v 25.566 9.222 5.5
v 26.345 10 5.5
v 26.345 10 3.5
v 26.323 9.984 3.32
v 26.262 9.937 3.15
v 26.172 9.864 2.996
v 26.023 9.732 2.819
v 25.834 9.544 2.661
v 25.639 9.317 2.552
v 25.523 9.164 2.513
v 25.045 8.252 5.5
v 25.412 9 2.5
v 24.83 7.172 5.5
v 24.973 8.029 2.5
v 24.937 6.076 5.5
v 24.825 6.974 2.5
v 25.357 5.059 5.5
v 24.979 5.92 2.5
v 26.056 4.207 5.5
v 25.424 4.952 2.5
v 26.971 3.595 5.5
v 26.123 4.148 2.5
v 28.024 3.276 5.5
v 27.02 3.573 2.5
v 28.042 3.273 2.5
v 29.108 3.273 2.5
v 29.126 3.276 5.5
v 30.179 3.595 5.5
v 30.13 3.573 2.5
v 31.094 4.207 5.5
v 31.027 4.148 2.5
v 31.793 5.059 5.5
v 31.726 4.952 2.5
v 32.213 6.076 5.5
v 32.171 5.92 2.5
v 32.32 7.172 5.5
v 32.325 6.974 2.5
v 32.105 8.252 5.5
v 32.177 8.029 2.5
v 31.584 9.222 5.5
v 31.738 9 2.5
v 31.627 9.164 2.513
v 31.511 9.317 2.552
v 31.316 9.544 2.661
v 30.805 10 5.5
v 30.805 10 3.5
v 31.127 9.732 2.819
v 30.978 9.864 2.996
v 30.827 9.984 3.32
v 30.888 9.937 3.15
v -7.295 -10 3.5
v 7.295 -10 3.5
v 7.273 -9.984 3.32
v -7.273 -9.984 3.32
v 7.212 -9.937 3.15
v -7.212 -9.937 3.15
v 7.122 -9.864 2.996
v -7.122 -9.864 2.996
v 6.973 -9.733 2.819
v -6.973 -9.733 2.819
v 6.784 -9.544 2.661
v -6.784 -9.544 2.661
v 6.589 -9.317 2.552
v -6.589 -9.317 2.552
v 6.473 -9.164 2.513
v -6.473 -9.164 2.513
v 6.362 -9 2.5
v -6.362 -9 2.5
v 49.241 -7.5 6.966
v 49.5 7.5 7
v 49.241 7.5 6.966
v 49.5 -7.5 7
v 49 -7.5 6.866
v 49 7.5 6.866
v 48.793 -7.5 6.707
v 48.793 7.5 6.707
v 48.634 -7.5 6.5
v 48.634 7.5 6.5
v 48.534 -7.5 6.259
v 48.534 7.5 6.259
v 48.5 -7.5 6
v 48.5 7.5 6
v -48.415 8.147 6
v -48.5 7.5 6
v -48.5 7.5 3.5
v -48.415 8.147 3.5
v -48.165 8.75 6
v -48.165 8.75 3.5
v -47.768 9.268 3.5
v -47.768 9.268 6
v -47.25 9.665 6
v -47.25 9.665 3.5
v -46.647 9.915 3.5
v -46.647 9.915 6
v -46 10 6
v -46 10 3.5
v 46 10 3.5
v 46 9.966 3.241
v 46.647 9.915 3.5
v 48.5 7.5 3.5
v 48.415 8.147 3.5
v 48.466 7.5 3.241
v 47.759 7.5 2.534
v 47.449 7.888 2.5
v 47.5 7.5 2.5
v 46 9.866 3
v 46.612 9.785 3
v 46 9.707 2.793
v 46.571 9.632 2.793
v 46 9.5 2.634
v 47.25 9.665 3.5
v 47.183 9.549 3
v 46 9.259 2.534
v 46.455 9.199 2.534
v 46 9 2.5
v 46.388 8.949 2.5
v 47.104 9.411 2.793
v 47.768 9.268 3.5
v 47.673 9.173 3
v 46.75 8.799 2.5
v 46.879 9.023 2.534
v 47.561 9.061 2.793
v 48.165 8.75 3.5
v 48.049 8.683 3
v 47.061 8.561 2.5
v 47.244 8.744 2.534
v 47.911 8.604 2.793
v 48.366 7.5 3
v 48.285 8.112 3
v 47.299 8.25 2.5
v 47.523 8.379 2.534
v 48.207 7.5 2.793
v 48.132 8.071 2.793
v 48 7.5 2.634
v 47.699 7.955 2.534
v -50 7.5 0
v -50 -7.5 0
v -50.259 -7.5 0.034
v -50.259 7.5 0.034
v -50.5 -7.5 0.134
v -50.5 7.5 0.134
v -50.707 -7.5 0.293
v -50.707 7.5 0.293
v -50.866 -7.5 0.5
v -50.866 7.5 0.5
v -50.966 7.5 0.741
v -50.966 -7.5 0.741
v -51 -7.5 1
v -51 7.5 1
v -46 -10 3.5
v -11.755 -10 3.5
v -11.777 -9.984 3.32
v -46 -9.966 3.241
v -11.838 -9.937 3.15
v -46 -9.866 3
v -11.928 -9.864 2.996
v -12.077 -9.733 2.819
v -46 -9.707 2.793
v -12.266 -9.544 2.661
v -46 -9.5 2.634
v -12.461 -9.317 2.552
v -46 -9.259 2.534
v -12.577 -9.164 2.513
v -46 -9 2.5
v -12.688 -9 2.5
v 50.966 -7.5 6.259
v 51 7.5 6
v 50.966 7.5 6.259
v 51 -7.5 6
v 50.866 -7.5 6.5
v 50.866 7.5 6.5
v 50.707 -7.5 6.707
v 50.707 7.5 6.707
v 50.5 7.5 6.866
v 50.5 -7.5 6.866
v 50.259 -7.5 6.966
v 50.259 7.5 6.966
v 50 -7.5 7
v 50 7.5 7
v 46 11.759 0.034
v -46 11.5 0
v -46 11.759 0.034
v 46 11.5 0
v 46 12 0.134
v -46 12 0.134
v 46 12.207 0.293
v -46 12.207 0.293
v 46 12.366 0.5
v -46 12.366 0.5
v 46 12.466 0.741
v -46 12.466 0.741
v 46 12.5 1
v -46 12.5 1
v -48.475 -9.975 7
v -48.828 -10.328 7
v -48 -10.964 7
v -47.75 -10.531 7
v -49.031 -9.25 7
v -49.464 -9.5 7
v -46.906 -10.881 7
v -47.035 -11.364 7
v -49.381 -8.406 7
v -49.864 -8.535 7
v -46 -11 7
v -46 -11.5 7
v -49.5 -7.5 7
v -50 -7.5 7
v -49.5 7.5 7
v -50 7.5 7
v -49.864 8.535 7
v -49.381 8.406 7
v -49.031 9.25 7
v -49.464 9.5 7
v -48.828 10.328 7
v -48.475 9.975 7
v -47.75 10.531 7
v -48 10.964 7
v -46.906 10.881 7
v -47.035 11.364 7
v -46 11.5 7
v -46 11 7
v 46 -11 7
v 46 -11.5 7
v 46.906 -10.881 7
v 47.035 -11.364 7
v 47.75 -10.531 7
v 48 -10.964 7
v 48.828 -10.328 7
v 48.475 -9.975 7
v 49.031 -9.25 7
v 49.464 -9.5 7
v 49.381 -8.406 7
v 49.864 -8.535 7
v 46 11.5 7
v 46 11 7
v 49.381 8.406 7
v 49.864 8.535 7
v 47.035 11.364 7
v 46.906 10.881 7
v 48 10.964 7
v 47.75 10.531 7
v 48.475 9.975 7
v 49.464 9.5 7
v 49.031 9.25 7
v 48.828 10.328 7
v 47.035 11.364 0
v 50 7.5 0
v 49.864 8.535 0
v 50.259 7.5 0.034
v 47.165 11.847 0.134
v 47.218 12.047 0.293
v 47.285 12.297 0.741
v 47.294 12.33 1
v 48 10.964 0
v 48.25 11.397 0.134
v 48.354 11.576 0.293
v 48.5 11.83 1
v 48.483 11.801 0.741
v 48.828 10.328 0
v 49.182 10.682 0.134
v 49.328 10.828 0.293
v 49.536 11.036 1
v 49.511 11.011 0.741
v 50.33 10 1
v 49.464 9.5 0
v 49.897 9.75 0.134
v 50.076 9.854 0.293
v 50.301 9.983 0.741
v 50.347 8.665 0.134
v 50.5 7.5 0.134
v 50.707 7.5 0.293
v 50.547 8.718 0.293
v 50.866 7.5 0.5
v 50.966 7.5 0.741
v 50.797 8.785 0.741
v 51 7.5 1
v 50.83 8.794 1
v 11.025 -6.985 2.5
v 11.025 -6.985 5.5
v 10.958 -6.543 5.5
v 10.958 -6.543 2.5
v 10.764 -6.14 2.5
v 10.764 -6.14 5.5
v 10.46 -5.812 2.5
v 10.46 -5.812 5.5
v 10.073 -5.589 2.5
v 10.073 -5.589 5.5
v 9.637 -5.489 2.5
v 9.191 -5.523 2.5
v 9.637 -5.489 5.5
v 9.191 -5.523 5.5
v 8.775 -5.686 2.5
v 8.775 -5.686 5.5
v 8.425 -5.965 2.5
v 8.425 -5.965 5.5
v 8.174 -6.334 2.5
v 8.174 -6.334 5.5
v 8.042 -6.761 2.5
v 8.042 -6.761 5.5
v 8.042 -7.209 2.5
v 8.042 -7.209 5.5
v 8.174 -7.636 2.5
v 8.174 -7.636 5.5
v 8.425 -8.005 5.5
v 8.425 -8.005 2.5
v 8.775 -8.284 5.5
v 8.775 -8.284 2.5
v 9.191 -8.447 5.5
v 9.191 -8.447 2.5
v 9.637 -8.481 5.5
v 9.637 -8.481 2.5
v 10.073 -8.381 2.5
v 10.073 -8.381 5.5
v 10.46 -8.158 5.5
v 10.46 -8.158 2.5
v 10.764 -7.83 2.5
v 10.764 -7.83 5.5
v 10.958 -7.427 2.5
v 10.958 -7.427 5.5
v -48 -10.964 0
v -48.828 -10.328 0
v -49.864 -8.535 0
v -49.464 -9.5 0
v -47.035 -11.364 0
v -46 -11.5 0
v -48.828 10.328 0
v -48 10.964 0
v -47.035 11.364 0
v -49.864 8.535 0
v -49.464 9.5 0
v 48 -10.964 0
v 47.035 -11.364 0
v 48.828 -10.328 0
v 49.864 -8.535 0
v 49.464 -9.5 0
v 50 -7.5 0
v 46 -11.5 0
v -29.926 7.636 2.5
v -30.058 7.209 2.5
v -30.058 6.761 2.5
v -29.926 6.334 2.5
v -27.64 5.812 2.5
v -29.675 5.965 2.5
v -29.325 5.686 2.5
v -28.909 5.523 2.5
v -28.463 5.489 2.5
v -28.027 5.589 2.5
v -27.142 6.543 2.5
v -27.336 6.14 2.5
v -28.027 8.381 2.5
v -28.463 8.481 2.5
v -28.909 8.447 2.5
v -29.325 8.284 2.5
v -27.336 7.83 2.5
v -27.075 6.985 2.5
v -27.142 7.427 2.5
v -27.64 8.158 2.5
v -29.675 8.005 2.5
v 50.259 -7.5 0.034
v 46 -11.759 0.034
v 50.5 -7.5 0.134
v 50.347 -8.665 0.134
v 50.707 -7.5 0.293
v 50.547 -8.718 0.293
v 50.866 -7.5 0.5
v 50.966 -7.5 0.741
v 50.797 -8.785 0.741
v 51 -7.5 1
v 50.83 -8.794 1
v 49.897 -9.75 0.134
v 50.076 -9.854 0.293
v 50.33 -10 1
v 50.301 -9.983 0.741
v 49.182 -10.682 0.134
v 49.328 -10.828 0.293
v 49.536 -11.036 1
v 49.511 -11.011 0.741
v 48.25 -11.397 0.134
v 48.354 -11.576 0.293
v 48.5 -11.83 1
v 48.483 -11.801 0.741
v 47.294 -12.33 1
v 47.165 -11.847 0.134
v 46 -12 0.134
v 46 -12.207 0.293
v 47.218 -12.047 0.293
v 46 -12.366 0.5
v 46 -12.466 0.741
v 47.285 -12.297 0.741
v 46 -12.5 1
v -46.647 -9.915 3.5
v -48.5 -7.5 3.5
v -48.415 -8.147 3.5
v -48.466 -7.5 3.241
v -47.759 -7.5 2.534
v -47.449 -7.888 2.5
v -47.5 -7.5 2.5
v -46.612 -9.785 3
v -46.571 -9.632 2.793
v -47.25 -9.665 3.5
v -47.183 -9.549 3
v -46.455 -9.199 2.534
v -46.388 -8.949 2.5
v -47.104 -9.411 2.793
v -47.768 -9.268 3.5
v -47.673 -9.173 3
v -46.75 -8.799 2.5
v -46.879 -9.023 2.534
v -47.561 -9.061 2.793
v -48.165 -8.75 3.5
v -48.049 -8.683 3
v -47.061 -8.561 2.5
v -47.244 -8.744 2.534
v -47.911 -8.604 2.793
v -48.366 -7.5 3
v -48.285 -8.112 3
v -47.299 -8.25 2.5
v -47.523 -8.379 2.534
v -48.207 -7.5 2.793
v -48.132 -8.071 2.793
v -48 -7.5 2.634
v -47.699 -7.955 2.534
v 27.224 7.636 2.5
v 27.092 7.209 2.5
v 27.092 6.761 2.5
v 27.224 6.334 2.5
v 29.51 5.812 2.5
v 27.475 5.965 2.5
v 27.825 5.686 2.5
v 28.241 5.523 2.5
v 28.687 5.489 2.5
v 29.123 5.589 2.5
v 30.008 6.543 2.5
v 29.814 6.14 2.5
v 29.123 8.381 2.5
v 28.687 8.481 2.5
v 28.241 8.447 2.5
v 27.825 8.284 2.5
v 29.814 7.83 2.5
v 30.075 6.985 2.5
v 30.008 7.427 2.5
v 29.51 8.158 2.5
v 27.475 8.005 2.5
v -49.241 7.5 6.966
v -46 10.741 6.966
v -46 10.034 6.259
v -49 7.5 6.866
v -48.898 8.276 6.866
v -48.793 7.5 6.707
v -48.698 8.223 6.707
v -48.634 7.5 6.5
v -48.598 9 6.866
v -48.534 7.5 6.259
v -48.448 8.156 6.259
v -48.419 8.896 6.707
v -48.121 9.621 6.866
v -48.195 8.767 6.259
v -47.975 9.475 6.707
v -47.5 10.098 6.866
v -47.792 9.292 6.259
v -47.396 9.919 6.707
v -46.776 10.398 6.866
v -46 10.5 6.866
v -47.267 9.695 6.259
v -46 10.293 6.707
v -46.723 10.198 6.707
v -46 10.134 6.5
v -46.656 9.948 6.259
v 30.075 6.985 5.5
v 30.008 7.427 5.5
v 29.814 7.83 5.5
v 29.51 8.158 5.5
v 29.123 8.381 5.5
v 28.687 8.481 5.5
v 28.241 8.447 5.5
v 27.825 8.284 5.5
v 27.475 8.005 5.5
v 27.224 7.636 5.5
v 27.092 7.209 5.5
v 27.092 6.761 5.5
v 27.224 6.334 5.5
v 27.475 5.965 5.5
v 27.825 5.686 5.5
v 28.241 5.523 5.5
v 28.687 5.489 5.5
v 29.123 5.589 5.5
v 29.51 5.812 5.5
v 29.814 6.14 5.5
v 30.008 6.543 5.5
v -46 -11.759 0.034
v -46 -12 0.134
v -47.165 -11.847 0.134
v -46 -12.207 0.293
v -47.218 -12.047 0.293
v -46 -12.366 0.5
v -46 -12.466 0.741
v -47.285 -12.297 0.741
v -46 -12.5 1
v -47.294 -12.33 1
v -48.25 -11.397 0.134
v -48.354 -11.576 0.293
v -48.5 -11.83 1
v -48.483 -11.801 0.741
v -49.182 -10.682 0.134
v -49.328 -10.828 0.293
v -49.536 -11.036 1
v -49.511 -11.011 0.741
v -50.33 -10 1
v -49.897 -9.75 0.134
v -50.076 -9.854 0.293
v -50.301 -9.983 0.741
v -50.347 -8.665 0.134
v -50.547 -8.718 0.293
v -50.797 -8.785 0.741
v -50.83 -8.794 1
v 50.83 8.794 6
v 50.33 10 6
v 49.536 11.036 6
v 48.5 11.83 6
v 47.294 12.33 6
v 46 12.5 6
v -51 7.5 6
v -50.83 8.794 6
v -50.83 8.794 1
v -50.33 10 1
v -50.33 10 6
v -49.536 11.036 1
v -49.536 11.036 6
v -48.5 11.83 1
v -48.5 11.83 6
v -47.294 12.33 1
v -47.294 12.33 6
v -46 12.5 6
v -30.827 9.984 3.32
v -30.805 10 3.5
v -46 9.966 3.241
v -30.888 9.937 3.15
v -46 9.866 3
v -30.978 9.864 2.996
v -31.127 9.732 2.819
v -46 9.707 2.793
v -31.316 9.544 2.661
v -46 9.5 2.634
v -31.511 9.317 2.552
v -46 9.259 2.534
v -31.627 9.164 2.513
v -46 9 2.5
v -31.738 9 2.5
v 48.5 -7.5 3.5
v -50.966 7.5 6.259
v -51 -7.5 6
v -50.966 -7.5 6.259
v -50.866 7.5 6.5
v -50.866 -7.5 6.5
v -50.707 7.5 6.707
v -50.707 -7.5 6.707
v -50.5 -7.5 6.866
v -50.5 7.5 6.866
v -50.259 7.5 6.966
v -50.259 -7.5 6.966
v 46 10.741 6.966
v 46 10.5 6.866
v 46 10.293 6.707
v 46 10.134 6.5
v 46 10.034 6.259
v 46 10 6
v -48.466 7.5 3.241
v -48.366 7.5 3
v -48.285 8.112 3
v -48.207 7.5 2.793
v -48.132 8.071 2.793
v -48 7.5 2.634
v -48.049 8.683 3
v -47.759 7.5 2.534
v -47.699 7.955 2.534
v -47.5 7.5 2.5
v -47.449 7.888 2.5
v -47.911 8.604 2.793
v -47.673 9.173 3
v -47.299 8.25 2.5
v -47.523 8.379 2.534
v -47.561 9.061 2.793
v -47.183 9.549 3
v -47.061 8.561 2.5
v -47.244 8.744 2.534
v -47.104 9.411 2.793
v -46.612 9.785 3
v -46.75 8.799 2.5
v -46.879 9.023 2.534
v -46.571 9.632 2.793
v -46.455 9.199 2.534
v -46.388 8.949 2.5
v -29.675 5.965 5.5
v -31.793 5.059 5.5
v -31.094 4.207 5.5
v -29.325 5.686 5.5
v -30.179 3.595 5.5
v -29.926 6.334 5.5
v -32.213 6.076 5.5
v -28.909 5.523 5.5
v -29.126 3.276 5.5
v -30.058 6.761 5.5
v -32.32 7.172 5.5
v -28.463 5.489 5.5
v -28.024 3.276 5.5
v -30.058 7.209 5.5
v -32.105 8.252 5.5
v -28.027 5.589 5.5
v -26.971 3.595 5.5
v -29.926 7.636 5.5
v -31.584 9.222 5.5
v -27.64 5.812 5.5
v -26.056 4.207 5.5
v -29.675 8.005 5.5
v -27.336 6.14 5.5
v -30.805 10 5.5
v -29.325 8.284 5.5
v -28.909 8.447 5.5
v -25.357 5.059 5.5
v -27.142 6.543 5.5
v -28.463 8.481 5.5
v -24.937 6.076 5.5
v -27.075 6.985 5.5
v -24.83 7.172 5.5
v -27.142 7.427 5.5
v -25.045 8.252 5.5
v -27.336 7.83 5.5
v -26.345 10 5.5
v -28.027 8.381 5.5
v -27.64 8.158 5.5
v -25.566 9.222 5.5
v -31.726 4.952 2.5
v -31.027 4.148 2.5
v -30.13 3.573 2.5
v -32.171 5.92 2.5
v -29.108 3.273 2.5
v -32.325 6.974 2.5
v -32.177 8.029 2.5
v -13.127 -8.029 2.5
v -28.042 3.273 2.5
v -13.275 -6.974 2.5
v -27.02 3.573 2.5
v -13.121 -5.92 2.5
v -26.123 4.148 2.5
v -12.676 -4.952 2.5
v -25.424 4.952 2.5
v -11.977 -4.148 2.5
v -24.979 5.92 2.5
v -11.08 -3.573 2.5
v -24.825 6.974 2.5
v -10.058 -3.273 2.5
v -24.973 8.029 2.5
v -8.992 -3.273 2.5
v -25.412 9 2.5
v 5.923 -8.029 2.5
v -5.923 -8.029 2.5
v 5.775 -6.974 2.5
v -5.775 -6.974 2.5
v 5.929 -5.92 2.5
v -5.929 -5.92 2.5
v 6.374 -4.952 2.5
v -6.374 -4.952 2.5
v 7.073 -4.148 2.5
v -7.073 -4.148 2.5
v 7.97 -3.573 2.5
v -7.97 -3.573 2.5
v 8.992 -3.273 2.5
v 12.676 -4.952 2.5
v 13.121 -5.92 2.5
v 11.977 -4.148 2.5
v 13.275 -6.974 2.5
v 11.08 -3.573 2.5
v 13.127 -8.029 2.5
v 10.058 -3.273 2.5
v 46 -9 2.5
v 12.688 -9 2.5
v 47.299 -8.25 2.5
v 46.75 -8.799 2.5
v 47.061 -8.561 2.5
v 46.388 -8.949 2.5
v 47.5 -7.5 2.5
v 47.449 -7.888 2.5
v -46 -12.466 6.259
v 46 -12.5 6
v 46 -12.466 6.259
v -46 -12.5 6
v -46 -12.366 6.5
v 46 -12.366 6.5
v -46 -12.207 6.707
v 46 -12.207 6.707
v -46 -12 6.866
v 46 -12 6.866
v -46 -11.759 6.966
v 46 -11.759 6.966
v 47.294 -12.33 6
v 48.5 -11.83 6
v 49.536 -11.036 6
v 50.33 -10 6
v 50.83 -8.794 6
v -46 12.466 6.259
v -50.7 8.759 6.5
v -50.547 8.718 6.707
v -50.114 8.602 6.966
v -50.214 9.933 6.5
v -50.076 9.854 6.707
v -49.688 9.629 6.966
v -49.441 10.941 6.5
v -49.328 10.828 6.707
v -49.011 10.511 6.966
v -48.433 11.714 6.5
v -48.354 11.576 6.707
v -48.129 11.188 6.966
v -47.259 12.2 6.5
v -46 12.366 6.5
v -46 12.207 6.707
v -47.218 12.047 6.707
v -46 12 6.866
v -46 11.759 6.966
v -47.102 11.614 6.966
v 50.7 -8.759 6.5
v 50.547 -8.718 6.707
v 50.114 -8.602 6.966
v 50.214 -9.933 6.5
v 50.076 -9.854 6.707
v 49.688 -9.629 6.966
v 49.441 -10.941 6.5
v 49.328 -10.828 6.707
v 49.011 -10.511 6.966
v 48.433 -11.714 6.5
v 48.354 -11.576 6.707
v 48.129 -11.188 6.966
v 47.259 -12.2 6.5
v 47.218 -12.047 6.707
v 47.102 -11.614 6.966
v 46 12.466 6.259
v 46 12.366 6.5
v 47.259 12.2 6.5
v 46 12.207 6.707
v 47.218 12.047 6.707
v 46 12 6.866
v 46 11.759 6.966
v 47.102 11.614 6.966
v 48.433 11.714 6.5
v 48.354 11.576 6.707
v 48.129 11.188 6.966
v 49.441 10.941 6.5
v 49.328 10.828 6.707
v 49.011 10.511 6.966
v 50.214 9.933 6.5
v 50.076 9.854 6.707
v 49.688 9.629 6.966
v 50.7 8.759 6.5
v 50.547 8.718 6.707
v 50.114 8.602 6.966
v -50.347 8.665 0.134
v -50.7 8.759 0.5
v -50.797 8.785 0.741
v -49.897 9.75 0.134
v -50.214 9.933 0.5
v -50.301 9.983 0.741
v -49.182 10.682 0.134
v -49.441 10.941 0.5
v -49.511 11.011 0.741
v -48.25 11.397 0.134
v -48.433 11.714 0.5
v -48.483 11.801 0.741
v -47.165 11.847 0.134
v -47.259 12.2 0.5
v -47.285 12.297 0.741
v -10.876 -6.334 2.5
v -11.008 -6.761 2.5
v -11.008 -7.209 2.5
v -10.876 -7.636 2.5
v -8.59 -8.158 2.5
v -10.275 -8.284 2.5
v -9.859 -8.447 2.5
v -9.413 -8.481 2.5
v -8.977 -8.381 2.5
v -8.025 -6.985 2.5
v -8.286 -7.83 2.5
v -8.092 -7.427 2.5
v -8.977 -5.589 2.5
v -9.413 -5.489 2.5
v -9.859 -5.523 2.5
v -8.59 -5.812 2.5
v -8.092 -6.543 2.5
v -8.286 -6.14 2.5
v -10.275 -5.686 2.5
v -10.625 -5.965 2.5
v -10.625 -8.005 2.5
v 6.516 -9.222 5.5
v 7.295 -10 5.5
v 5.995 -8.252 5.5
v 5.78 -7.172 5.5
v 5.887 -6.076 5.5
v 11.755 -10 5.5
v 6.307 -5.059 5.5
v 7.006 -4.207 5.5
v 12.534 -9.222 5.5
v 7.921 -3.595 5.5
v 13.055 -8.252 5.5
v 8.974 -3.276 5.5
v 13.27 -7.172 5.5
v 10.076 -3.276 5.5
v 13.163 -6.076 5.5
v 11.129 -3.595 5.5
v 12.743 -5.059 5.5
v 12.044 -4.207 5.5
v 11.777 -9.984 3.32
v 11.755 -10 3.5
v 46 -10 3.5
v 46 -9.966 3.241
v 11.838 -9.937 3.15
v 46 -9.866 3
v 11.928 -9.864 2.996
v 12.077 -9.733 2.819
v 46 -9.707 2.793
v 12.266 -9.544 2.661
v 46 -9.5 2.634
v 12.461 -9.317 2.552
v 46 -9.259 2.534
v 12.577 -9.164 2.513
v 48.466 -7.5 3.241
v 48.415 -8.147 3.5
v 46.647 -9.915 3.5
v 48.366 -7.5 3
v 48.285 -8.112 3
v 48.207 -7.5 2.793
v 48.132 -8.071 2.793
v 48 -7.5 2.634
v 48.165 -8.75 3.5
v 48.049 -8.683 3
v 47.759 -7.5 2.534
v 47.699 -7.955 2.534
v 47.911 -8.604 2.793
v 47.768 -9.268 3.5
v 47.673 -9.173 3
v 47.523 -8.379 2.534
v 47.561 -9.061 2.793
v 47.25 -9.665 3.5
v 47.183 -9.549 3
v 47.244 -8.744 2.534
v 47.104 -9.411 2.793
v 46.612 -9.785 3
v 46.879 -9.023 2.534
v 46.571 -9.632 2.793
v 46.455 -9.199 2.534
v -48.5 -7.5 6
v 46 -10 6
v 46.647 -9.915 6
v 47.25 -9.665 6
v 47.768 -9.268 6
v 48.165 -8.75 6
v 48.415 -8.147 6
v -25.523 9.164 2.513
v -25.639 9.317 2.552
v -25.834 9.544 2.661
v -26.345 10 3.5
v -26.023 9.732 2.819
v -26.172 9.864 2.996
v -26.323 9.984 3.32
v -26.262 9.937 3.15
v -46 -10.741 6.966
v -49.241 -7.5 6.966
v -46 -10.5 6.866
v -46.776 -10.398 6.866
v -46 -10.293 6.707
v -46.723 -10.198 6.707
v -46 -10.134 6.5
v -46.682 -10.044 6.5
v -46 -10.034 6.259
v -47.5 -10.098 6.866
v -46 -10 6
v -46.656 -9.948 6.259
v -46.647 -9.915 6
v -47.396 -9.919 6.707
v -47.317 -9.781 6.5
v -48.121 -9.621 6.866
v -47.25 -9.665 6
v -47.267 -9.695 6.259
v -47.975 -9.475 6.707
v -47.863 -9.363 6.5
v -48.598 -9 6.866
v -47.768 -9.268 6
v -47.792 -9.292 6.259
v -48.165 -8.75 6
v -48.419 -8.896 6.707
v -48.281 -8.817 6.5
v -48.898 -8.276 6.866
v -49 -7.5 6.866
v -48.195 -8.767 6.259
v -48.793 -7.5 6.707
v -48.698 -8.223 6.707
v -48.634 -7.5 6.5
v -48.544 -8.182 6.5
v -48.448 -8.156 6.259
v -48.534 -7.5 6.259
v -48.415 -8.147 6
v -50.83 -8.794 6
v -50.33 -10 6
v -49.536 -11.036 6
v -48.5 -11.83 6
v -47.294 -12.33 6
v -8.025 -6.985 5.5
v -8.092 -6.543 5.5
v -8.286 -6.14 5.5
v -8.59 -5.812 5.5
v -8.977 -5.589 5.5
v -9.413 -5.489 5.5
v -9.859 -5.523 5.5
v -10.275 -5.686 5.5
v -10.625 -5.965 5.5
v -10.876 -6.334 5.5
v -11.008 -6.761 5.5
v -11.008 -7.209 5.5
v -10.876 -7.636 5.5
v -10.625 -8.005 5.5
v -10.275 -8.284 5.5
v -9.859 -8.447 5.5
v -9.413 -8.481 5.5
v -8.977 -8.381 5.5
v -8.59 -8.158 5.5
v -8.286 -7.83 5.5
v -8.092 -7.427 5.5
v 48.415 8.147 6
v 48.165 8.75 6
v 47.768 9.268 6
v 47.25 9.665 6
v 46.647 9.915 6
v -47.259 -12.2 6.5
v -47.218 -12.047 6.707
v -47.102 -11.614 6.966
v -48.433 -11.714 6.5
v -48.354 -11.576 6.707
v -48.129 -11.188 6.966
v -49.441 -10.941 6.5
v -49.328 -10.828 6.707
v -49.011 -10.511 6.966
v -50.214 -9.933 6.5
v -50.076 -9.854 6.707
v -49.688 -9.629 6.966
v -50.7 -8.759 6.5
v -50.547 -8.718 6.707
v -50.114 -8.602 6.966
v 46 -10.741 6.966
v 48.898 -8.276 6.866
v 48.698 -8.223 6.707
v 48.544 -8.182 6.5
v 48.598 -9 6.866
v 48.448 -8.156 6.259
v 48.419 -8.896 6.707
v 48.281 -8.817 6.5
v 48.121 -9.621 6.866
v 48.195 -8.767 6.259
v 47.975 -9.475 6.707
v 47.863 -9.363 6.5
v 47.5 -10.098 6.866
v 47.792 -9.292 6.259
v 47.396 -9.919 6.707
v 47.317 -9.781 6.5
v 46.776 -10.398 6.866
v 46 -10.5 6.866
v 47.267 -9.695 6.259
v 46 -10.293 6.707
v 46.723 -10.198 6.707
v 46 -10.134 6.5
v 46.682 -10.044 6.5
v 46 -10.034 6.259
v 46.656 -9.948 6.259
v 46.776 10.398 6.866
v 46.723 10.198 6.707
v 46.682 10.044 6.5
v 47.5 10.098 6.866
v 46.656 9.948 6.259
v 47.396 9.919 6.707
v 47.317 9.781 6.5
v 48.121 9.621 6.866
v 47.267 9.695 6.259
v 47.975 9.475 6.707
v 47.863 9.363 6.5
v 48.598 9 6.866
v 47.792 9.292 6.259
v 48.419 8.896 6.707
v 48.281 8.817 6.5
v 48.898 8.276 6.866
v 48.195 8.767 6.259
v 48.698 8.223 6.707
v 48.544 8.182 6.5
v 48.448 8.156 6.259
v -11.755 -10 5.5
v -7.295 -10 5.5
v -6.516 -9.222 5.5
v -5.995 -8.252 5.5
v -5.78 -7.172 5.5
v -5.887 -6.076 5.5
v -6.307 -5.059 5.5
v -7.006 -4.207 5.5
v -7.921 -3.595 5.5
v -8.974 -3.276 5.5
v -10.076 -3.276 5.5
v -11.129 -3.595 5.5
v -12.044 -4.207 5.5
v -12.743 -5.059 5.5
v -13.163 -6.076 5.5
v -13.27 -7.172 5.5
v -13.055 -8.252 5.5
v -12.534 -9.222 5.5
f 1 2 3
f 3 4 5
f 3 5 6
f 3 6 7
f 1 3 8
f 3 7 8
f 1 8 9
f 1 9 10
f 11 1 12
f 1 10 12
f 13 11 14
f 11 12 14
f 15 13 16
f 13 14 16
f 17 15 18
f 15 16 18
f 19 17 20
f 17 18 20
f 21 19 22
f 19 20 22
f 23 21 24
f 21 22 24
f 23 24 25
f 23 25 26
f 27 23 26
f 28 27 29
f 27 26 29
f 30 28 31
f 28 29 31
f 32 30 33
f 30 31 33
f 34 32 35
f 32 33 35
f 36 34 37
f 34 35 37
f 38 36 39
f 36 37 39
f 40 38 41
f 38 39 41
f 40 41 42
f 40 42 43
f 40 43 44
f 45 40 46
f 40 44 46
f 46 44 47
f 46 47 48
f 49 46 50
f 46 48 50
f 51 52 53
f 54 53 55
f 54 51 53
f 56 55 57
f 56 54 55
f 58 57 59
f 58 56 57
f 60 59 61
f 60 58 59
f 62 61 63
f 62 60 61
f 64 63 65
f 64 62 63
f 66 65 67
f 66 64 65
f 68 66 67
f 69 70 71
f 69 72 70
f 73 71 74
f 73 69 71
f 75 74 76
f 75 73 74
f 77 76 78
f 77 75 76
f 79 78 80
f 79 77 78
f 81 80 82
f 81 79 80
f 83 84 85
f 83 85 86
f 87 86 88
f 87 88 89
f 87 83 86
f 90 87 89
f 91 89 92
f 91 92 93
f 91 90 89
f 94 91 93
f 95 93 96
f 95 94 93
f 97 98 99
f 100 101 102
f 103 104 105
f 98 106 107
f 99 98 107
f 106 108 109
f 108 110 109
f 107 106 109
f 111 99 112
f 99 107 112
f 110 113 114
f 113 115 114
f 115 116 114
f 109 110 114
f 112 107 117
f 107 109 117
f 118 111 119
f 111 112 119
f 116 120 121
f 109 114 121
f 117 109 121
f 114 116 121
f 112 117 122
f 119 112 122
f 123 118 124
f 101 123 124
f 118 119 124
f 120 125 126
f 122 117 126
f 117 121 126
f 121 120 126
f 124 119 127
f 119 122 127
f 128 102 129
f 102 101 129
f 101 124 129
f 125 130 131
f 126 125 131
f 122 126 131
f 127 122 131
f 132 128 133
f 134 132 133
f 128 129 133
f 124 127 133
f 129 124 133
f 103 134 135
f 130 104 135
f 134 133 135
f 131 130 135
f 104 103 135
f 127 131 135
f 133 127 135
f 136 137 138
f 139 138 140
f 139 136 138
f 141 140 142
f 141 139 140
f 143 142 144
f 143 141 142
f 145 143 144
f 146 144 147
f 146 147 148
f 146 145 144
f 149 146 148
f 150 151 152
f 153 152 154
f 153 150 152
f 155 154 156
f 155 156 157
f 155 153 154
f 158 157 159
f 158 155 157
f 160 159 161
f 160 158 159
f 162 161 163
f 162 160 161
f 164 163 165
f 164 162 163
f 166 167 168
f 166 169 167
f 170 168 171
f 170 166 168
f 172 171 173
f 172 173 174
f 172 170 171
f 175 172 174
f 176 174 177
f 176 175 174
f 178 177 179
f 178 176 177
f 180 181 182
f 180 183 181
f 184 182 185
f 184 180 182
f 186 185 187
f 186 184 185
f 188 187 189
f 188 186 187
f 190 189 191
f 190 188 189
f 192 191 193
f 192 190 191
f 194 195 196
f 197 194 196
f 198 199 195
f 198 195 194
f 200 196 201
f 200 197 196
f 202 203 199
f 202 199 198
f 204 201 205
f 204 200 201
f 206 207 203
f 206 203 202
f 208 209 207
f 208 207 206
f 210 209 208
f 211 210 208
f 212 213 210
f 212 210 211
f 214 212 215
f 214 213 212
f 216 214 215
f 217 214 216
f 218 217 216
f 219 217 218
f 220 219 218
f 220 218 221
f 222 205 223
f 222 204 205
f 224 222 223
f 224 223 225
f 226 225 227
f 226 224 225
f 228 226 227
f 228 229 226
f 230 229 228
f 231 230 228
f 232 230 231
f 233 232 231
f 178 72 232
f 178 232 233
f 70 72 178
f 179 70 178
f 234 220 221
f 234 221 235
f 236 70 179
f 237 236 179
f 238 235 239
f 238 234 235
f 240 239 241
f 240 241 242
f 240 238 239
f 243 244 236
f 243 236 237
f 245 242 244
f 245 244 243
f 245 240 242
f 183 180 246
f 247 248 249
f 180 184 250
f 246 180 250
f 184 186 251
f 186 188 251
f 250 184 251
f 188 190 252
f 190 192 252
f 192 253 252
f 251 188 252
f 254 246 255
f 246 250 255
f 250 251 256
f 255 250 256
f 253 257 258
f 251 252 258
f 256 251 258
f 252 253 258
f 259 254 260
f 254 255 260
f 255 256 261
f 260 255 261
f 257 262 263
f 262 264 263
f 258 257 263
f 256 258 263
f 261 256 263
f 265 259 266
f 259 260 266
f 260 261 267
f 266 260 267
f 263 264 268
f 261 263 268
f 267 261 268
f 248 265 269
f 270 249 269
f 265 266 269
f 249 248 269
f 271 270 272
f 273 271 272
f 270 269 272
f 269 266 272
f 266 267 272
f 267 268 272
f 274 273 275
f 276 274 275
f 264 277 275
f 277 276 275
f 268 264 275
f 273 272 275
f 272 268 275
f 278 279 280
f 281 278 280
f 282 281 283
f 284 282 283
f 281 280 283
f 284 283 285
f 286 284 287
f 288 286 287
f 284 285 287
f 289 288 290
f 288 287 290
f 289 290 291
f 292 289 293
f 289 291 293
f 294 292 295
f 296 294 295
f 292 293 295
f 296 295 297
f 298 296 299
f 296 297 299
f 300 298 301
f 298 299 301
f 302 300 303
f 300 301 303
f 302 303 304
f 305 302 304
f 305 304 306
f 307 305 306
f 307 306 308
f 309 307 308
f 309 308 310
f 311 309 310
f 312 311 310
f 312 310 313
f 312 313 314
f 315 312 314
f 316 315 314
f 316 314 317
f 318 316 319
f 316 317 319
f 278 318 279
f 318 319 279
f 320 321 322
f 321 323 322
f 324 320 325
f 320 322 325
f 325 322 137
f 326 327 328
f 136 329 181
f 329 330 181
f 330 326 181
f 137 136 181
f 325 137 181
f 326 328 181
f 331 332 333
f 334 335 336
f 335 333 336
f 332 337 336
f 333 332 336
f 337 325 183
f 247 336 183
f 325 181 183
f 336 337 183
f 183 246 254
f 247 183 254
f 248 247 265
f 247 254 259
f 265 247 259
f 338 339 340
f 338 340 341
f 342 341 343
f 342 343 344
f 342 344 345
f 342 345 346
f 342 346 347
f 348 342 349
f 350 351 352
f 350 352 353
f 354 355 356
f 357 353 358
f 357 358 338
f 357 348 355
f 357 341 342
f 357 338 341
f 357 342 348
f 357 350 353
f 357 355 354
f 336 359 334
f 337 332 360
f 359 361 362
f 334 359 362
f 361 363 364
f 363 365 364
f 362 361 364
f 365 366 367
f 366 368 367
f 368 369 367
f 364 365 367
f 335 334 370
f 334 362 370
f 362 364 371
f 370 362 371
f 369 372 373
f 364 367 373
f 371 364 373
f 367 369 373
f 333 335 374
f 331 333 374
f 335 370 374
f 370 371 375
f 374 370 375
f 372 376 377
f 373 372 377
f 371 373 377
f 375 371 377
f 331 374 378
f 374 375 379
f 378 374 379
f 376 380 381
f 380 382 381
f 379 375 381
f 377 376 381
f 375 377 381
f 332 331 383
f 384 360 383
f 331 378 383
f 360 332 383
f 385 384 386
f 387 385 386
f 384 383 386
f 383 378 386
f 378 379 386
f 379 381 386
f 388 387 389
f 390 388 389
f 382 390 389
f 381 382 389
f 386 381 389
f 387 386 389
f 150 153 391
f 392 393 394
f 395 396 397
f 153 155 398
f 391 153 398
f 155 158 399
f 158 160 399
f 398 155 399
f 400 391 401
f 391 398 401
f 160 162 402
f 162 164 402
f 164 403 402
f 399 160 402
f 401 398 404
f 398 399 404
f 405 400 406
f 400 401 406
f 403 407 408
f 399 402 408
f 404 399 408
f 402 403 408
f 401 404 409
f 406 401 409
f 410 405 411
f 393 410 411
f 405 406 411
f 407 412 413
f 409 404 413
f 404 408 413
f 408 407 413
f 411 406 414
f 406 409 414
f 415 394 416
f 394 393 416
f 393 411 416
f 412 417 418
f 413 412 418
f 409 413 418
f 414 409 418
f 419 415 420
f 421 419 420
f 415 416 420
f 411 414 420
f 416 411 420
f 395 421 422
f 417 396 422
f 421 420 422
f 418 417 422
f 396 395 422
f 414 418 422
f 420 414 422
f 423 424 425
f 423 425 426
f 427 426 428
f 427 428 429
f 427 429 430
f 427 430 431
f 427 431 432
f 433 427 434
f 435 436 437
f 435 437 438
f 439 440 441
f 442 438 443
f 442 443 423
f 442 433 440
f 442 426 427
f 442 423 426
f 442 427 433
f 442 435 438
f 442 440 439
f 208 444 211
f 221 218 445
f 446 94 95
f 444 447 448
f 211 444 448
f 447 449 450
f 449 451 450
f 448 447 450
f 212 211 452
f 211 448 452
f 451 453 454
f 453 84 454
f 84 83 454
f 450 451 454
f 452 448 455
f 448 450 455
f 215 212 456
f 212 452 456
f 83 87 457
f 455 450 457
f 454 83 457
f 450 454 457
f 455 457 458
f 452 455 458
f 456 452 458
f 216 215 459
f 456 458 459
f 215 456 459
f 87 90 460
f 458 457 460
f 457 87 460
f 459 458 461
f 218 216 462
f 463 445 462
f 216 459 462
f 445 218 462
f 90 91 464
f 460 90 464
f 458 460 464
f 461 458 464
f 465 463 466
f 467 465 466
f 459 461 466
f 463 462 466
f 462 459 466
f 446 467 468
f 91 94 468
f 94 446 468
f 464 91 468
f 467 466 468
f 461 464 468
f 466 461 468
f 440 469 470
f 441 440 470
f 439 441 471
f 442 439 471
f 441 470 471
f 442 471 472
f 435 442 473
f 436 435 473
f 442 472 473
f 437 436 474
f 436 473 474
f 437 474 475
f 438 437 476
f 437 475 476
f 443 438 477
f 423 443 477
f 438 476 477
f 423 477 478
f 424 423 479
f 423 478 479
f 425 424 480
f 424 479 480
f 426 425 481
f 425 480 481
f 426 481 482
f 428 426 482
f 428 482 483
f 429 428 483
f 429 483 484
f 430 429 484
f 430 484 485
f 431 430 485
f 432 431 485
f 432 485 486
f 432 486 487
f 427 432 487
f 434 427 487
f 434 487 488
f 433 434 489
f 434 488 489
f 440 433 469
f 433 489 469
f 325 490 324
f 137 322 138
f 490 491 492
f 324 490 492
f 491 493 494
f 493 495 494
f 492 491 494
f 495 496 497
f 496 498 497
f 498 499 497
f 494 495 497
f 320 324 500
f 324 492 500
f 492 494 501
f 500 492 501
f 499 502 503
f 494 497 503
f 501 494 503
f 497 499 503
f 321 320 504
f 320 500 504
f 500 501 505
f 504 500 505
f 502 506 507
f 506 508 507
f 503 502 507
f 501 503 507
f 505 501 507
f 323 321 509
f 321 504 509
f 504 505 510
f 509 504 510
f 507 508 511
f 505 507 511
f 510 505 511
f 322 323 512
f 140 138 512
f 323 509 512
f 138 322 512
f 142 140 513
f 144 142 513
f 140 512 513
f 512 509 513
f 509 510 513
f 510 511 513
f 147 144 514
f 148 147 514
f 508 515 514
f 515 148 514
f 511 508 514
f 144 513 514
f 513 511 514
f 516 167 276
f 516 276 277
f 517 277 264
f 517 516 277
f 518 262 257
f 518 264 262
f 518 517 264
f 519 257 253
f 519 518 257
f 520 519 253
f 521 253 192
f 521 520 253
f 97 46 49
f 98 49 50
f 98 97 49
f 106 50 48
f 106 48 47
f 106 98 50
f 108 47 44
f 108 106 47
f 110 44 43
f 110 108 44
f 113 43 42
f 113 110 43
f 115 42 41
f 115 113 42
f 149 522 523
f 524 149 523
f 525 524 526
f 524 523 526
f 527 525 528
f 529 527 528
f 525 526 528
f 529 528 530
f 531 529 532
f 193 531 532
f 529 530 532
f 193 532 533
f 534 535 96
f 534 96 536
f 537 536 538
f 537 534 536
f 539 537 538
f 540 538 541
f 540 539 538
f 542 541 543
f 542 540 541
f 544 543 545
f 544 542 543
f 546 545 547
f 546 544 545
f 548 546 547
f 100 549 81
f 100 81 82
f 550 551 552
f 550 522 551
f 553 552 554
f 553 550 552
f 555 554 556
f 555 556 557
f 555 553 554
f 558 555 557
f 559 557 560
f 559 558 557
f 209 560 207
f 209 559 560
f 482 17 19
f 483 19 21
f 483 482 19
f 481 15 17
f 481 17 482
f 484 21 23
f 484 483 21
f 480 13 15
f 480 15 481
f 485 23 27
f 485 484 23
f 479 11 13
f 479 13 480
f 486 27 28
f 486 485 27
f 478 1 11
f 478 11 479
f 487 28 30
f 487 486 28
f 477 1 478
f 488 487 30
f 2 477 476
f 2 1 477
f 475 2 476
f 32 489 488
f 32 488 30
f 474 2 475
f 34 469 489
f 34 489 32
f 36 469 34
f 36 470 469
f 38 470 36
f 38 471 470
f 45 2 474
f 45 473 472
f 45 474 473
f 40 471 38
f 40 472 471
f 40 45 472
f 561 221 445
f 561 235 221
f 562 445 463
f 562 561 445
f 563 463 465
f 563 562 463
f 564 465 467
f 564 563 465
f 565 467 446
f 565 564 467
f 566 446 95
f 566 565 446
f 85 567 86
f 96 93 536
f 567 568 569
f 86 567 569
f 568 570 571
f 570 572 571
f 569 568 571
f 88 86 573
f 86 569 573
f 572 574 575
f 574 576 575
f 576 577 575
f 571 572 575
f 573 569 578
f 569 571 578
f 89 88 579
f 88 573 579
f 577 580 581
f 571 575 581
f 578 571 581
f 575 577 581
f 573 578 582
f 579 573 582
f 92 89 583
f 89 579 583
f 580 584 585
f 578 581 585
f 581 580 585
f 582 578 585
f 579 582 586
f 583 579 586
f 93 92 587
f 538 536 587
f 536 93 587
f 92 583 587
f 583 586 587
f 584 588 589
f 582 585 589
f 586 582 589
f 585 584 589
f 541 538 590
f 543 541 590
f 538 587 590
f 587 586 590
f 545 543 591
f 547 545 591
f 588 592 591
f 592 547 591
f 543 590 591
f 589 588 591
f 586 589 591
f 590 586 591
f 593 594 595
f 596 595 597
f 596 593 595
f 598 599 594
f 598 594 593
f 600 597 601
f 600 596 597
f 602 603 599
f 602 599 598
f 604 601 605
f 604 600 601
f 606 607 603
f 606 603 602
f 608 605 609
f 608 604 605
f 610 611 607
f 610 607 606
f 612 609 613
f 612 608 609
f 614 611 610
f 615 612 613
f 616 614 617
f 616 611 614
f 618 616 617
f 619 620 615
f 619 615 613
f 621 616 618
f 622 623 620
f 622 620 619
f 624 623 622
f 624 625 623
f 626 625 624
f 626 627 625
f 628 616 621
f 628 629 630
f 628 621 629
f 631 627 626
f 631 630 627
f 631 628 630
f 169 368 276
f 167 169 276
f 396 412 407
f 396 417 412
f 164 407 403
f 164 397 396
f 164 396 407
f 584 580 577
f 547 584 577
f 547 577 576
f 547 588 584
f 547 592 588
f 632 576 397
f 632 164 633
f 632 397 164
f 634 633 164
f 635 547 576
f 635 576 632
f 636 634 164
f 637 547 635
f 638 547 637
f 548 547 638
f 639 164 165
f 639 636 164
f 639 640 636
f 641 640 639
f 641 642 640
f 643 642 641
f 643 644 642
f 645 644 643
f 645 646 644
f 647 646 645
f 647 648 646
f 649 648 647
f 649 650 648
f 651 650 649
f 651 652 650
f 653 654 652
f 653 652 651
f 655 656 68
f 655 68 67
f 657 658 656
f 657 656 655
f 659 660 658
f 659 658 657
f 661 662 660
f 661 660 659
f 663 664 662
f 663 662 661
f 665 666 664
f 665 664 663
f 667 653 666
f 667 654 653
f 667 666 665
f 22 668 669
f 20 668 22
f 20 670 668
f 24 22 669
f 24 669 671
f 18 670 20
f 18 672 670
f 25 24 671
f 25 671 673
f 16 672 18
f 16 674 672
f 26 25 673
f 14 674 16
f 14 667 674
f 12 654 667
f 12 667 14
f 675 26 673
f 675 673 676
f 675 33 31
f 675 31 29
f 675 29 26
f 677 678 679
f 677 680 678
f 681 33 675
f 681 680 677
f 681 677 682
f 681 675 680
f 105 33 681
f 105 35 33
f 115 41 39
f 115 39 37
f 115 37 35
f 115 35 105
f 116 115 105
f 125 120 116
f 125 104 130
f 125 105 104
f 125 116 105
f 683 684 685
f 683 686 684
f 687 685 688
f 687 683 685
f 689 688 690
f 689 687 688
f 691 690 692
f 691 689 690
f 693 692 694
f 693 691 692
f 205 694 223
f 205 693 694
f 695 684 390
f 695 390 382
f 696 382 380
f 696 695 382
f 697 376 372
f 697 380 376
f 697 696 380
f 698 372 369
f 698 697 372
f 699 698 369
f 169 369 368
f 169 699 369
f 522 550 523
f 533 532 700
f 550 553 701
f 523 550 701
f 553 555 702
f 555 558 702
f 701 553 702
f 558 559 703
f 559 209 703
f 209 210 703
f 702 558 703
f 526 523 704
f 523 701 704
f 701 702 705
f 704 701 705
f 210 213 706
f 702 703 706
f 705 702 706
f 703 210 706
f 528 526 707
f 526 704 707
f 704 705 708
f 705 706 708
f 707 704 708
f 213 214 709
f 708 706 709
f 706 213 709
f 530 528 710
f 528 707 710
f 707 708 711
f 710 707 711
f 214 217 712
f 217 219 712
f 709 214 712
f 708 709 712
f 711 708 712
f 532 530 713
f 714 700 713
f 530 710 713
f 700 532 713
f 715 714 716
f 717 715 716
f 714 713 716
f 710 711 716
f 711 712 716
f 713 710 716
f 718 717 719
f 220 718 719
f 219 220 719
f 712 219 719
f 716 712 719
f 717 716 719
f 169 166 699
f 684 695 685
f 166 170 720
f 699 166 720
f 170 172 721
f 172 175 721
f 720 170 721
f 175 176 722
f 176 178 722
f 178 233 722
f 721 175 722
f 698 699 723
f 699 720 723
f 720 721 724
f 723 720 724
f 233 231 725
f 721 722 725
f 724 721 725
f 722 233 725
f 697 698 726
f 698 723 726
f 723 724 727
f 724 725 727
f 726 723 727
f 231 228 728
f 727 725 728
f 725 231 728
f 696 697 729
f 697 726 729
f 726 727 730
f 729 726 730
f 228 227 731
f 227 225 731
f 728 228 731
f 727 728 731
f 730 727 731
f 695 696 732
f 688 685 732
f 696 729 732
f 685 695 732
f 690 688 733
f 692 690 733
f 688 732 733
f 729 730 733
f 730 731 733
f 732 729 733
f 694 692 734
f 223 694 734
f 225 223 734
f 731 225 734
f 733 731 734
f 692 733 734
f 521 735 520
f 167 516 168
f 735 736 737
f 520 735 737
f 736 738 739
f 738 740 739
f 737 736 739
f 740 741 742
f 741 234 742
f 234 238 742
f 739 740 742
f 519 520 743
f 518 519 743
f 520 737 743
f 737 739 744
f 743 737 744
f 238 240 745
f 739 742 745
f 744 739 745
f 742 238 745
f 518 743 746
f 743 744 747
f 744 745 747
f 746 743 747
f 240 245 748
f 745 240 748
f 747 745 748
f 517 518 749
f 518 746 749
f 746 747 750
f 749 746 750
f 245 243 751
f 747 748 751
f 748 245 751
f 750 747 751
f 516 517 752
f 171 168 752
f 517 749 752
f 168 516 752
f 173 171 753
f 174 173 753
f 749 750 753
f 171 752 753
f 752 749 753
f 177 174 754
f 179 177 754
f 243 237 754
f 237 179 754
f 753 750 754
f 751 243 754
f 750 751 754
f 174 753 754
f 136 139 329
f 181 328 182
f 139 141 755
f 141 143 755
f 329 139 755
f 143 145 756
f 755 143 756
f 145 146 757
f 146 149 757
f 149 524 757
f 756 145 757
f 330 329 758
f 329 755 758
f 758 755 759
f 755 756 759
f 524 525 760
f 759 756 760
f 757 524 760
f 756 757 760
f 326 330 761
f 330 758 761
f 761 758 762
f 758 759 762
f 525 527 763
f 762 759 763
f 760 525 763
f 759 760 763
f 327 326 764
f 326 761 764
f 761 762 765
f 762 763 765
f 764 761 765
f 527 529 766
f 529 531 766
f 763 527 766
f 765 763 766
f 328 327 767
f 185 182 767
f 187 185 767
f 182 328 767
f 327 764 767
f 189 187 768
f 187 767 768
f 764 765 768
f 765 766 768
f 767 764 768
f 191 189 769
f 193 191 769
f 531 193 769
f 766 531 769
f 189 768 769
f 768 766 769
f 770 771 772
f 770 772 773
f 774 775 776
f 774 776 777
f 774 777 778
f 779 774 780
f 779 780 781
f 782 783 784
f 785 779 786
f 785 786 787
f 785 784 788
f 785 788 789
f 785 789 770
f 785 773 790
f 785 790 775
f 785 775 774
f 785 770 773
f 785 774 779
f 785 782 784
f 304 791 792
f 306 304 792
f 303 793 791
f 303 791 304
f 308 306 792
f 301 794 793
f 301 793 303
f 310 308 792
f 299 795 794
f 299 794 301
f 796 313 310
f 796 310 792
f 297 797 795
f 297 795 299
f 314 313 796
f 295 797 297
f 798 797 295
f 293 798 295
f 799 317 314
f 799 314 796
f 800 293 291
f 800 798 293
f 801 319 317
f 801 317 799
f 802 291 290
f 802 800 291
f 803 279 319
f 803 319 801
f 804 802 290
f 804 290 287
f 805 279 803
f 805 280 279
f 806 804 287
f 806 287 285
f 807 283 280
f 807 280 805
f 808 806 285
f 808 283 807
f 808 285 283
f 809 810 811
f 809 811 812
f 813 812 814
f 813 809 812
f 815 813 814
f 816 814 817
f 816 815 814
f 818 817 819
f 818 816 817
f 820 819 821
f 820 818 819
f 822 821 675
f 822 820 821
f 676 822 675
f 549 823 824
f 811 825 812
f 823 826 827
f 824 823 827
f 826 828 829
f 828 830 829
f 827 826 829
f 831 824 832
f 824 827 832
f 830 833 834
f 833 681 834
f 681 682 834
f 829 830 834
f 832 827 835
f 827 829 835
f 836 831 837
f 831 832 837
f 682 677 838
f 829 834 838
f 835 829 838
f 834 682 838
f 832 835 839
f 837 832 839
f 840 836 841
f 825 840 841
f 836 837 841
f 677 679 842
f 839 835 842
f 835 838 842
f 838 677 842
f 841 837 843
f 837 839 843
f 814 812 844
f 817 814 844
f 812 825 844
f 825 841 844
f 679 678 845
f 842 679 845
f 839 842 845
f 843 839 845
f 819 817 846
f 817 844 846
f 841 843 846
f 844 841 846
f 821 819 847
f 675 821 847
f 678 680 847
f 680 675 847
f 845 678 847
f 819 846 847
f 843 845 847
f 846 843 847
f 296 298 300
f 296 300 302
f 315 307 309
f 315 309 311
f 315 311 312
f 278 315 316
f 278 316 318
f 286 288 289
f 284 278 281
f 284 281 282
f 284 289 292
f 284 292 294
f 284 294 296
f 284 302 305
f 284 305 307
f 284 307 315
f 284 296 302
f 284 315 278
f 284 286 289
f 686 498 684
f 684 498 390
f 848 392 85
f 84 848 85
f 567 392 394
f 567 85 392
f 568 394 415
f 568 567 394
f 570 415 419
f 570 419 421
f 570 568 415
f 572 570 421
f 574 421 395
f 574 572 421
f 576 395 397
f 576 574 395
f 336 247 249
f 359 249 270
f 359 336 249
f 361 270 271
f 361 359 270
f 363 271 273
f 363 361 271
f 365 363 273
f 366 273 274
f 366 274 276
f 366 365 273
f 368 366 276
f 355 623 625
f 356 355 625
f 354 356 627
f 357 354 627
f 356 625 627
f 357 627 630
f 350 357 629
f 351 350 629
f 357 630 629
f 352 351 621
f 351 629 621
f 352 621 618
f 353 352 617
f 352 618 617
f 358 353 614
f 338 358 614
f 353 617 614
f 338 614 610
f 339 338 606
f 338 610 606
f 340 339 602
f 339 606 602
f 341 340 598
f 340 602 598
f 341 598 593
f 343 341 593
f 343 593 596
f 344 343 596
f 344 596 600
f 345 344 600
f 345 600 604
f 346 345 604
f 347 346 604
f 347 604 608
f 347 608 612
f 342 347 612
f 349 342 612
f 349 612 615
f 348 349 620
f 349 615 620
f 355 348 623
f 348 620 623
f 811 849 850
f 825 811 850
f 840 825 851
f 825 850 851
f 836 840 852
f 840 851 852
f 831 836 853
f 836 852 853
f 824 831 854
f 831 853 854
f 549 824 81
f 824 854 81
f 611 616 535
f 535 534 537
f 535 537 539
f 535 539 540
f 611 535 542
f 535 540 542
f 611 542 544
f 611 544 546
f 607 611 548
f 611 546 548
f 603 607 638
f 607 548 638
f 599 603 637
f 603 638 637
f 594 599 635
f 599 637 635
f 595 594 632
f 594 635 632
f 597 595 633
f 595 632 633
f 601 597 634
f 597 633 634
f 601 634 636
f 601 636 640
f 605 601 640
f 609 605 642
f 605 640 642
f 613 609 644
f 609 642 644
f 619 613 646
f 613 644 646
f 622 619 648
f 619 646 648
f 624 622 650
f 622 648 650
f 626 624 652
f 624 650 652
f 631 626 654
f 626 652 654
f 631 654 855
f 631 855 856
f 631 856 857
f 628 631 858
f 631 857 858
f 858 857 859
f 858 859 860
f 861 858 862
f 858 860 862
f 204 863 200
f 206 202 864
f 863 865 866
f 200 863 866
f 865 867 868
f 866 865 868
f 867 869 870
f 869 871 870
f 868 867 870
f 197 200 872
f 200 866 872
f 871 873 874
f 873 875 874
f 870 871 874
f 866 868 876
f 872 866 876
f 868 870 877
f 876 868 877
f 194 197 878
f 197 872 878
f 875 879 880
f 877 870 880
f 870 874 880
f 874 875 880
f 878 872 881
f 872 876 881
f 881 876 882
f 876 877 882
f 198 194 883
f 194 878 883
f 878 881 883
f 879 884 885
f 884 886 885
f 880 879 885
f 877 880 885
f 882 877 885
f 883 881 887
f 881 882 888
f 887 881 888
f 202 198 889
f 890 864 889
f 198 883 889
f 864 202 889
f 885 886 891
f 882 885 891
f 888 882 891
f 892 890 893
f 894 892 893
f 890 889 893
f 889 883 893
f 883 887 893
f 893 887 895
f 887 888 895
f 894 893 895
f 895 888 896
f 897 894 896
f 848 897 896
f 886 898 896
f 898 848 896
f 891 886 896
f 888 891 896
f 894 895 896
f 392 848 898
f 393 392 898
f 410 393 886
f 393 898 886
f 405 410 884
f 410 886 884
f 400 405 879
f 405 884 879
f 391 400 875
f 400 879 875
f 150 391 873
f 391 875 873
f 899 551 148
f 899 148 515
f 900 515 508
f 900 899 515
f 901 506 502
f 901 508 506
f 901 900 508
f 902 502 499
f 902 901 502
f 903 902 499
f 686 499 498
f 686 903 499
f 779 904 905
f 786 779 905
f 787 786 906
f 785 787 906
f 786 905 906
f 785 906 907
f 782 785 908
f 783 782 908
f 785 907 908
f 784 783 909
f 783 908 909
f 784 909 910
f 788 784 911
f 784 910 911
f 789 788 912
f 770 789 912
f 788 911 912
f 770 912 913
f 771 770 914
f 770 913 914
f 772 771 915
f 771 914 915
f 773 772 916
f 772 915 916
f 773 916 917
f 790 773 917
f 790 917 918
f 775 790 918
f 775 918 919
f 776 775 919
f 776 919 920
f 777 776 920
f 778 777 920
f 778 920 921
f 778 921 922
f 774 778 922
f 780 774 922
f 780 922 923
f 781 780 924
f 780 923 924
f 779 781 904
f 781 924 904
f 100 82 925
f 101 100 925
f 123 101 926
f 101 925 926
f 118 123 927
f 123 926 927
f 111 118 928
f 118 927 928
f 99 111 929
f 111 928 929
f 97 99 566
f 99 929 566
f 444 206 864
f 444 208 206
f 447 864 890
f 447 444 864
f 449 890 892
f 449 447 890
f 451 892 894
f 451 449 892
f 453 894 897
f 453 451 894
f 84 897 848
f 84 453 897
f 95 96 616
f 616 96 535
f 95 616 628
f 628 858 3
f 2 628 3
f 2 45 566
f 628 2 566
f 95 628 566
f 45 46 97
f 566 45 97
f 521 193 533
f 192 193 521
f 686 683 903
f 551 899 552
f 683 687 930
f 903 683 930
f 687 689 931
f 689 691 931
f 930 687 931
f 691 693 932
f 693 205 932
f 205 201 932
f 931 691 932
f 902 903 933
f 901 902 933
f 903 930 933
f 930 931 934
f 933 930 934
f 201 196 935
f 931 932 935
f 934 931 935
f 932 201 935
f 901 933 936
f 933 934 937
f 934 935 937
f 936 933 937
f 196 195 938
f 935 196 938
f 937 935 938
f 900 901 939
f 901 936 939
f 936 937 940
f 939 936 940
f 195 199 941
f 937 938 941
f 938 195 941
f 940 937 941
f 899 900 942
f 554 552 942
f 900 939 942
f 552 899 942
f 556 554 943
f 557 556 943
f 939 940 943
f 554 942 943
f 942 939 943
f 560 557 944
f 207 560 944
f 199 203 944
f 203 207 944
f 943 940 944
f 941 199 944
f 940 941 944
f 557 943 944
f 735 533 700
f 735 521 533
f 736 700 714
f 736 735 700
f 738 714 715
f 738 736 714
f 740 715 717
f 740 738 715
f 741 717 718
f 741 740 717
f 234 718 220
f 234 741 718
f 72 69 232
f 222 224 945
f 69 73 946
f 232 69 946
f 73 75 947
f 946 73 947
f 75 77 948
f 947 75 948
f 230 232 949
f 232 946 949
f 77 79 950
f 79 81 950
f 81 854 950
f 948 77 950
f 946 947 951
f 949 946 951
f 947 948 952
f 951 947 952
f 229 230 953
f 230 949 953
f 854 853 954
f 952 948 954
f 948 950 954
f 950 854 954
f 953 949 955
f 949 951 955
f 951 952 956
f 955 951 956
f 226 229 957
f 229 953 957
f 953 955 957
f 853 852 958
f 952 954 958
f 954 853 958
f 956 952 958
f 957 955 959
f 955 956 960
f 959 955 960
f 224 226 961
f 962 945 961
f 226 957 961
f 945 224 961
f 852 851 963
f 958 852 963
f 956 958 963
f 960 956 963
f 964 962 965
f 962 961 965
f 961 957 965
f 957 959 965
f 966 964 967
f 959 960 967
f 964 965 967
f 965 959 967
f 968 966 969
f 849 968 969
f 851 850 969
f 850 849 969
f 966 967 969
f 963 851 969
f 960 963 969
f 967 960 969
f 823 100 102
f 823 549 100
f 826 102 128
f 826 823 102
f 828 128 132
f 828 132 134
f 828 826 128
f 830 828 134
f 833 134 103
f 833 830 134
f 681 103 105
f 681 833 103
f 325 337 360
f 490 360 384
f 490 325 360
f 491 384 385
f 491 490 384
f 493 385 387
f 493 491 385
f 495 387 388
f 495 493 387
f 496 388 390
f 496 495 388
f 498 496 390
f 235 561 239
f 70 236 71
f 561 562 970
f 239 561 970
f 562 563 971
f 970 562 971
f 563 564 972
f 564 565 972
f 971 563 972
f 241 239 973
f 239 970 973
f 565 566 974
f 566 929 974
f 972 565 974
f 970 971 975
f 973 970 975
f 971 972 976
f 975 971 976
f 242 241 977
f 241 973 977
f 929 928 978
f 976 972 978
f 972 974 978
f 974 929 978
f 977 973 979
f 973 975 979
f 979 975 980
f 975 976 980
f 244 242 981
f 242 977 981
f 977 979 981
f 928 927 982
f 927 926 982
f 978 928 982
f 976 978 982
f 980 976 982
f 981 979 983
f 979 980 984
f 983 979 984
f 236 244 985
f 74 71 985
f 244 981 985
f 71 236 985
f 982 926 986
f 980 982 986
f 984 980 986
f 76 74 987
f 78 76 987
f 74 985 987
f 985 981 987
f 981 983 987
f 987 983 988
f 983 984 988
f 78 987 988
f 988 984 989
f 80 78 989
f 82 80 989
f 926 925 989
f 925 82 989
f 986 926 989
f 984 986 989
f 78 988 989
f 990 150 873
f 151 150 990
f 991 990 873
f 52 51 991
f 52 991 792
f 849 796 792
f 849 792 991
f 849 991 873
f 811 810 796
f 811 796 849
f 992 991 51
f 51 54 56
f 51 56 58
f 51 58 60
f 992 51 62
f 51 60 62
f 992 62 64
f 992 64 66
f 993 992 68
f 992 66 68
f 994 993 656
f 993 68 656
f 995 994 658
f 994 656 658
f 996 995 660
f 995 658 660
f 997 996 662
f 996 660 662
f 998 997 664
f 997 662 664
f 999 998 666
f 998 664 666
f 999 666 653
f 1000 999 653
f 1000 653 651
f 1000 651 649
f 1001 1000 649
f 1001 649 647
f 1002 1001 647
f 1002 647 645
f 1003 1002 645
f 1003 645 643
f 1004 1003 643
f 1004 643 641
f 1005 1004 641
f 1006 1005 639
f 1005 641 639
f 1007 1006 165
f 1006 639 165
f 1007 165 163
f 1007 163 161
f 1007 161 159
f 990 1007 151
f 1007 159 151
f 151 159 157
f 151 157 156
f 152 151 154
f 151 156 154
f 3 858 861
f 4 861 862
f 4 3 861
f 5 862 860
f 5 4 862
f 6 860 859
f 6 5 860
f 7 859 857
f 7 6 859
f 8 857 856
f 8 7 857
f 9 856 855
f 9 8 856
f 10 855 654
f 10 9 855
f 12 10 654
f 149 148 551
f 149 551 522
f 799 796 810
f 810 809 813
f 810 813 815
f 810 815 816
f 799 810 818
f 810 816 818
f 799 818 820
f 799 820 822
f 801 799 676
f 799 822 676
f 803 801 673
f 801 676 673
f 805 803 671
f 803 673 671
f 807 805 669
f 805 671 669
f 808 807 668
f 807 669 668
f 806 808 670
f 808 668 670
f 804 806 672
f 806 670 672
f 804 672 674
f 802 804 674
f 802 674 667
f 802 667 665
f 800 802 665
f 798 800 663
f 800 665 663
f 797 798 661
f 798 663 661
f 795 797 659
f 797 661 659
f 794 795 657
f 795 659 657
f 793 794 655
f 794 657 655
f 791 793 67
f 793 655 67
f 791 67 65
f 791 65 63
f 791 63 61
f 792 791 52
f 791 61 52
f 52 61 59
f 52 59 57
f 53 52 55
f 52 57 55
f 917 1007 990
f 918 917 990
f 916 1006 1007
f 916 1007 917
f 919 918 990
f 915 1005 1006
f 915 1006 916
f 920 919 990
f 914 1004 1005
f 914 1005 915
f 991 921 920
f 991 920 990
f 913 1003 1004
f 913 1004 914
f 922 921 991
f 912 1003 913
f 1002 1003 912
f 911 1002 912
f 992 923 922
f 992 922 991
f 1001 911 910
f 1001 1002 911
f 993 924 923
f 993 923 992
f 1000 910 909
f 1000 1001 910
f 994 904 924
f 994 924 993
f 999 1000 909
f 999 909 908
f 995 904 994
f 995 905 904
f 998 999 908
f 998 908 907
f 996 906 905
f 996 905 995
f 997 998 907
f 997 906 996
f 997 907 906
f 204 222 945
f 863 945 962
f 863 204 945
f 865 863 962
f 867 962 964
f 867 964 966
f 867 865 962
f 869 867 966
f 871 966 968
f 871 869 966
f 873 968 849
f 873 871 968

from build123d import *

# Parameters (mm, degrees)
F0_W     = 102
F0_H     = 25
F1_DEPTH = 7
F2_R     = 5
F3_T     = -2.5
F4_R     = 1
F5_R     = 3.75
F6_DEPTH = 3
F7_R     = 1.5
F8_DEPTH = 3


with BuildPart() as f1:
    # F0 (on Top) → F1 (new body)
    with BuildSketch(Plane.XY):
        Rectangle(F0_W, F0_H)
    extrude(amount=F1_DEPTH)

    # F2
    f2_edges = [f1.edges().sort_by_distance(p)[0] for p in [
        (-51, -12.5, 3.5),
        (-51, 12.5, 3.5),
        (51, -12.5, 3.5),
        (51, 12.5, 3.5),
    ]]
    fillet(f2_edges, radius=F2_R)

    # F3
    f3_openings = [f1.faces().sort_by_distance(p)[0] for p in [
        (0, 0, 7),
    ]]
    offset(amount=F3_T, openings=f3_openings)

    # F4
    f4_edges = [f1.edges().sort_by_distance(p)[0] for p in [
        (-48.5, 0, 2.5),
        (-47.767767, -9.267767, 2.5),
        (0, -10, 2.5),
        (47.767767, -9.267767, 2.5),
        (48.5, 0, 2.5),
        (47.767767, 9.267767, 2.5),
        (0, 10, 2.5),
        (-47.767767, 9.267767, 2.5),
        (0, 12.5, 7),
        (-49.535534, 11.035534, 7),
        (-51, 0, 7),
        (-49.535534, -11.035534, 7),
        (0, -12.5, 7),
        (49.535534, -11.035534, 7),
        (51, 0, 7),
        (49.535534, 11.035534, 7),
        (0, 10, 7),
        (47.767767, 9.267767, 7),
        (48.5, 0, 7),
        (47.767767, -9.267767, 7),
        (0, -10, 7),
        (-47.767767, -9.267767, 7),
        (-48.5, 0, 7),
        (-47.767767, 9.267767, 7),
        (0, 12.5, 0),
        (49.535534, 11.035534, 0),
        (-49.535534, 11.035534, 0),
        (51, 0, 0),
        (-51, 0, 0),
        (49.535534, -11.035534, 0),
        (-49.535534, -11.035534, 0),
        (0, -12.5, 0),
    ]]
    fillet(f4_edges, radius=F4_R)

    # F5 (on face) → F6 (join)
    with BuildSketch(Plane.XY.offset(2.5)):
        with Locations((-9.525, -6.985)):
            Circle(F5_R)
        with Locations((9.525, -6.985)):
            Circle(F5_R)
        with Locations((-28.575, 6.985)):
            Circle(F5_R)
        with Locations((28.575, 6.985)):
            Circle(F5_R)
    extrude(amount=F6_DEPTH)

    # F7 (on face) → F8 (cut, through all)
    with BuildSketch(Plane.XY.offset(5.5)):
        with Locations((-9.525, -6.985)):
            Circle(F7_R)
        with Locations((-28.575, 6.985)):
            Circle(F7_R)
        with Locations((9.525, -6.985)):
            Circle(F7_R)
        with Locations((28.575, 6.985)):
            Circle(F7_R)
    extrude(amount=-F8_DEPTH, mode=Mode.SUBTRACT)


solid = f1.part
